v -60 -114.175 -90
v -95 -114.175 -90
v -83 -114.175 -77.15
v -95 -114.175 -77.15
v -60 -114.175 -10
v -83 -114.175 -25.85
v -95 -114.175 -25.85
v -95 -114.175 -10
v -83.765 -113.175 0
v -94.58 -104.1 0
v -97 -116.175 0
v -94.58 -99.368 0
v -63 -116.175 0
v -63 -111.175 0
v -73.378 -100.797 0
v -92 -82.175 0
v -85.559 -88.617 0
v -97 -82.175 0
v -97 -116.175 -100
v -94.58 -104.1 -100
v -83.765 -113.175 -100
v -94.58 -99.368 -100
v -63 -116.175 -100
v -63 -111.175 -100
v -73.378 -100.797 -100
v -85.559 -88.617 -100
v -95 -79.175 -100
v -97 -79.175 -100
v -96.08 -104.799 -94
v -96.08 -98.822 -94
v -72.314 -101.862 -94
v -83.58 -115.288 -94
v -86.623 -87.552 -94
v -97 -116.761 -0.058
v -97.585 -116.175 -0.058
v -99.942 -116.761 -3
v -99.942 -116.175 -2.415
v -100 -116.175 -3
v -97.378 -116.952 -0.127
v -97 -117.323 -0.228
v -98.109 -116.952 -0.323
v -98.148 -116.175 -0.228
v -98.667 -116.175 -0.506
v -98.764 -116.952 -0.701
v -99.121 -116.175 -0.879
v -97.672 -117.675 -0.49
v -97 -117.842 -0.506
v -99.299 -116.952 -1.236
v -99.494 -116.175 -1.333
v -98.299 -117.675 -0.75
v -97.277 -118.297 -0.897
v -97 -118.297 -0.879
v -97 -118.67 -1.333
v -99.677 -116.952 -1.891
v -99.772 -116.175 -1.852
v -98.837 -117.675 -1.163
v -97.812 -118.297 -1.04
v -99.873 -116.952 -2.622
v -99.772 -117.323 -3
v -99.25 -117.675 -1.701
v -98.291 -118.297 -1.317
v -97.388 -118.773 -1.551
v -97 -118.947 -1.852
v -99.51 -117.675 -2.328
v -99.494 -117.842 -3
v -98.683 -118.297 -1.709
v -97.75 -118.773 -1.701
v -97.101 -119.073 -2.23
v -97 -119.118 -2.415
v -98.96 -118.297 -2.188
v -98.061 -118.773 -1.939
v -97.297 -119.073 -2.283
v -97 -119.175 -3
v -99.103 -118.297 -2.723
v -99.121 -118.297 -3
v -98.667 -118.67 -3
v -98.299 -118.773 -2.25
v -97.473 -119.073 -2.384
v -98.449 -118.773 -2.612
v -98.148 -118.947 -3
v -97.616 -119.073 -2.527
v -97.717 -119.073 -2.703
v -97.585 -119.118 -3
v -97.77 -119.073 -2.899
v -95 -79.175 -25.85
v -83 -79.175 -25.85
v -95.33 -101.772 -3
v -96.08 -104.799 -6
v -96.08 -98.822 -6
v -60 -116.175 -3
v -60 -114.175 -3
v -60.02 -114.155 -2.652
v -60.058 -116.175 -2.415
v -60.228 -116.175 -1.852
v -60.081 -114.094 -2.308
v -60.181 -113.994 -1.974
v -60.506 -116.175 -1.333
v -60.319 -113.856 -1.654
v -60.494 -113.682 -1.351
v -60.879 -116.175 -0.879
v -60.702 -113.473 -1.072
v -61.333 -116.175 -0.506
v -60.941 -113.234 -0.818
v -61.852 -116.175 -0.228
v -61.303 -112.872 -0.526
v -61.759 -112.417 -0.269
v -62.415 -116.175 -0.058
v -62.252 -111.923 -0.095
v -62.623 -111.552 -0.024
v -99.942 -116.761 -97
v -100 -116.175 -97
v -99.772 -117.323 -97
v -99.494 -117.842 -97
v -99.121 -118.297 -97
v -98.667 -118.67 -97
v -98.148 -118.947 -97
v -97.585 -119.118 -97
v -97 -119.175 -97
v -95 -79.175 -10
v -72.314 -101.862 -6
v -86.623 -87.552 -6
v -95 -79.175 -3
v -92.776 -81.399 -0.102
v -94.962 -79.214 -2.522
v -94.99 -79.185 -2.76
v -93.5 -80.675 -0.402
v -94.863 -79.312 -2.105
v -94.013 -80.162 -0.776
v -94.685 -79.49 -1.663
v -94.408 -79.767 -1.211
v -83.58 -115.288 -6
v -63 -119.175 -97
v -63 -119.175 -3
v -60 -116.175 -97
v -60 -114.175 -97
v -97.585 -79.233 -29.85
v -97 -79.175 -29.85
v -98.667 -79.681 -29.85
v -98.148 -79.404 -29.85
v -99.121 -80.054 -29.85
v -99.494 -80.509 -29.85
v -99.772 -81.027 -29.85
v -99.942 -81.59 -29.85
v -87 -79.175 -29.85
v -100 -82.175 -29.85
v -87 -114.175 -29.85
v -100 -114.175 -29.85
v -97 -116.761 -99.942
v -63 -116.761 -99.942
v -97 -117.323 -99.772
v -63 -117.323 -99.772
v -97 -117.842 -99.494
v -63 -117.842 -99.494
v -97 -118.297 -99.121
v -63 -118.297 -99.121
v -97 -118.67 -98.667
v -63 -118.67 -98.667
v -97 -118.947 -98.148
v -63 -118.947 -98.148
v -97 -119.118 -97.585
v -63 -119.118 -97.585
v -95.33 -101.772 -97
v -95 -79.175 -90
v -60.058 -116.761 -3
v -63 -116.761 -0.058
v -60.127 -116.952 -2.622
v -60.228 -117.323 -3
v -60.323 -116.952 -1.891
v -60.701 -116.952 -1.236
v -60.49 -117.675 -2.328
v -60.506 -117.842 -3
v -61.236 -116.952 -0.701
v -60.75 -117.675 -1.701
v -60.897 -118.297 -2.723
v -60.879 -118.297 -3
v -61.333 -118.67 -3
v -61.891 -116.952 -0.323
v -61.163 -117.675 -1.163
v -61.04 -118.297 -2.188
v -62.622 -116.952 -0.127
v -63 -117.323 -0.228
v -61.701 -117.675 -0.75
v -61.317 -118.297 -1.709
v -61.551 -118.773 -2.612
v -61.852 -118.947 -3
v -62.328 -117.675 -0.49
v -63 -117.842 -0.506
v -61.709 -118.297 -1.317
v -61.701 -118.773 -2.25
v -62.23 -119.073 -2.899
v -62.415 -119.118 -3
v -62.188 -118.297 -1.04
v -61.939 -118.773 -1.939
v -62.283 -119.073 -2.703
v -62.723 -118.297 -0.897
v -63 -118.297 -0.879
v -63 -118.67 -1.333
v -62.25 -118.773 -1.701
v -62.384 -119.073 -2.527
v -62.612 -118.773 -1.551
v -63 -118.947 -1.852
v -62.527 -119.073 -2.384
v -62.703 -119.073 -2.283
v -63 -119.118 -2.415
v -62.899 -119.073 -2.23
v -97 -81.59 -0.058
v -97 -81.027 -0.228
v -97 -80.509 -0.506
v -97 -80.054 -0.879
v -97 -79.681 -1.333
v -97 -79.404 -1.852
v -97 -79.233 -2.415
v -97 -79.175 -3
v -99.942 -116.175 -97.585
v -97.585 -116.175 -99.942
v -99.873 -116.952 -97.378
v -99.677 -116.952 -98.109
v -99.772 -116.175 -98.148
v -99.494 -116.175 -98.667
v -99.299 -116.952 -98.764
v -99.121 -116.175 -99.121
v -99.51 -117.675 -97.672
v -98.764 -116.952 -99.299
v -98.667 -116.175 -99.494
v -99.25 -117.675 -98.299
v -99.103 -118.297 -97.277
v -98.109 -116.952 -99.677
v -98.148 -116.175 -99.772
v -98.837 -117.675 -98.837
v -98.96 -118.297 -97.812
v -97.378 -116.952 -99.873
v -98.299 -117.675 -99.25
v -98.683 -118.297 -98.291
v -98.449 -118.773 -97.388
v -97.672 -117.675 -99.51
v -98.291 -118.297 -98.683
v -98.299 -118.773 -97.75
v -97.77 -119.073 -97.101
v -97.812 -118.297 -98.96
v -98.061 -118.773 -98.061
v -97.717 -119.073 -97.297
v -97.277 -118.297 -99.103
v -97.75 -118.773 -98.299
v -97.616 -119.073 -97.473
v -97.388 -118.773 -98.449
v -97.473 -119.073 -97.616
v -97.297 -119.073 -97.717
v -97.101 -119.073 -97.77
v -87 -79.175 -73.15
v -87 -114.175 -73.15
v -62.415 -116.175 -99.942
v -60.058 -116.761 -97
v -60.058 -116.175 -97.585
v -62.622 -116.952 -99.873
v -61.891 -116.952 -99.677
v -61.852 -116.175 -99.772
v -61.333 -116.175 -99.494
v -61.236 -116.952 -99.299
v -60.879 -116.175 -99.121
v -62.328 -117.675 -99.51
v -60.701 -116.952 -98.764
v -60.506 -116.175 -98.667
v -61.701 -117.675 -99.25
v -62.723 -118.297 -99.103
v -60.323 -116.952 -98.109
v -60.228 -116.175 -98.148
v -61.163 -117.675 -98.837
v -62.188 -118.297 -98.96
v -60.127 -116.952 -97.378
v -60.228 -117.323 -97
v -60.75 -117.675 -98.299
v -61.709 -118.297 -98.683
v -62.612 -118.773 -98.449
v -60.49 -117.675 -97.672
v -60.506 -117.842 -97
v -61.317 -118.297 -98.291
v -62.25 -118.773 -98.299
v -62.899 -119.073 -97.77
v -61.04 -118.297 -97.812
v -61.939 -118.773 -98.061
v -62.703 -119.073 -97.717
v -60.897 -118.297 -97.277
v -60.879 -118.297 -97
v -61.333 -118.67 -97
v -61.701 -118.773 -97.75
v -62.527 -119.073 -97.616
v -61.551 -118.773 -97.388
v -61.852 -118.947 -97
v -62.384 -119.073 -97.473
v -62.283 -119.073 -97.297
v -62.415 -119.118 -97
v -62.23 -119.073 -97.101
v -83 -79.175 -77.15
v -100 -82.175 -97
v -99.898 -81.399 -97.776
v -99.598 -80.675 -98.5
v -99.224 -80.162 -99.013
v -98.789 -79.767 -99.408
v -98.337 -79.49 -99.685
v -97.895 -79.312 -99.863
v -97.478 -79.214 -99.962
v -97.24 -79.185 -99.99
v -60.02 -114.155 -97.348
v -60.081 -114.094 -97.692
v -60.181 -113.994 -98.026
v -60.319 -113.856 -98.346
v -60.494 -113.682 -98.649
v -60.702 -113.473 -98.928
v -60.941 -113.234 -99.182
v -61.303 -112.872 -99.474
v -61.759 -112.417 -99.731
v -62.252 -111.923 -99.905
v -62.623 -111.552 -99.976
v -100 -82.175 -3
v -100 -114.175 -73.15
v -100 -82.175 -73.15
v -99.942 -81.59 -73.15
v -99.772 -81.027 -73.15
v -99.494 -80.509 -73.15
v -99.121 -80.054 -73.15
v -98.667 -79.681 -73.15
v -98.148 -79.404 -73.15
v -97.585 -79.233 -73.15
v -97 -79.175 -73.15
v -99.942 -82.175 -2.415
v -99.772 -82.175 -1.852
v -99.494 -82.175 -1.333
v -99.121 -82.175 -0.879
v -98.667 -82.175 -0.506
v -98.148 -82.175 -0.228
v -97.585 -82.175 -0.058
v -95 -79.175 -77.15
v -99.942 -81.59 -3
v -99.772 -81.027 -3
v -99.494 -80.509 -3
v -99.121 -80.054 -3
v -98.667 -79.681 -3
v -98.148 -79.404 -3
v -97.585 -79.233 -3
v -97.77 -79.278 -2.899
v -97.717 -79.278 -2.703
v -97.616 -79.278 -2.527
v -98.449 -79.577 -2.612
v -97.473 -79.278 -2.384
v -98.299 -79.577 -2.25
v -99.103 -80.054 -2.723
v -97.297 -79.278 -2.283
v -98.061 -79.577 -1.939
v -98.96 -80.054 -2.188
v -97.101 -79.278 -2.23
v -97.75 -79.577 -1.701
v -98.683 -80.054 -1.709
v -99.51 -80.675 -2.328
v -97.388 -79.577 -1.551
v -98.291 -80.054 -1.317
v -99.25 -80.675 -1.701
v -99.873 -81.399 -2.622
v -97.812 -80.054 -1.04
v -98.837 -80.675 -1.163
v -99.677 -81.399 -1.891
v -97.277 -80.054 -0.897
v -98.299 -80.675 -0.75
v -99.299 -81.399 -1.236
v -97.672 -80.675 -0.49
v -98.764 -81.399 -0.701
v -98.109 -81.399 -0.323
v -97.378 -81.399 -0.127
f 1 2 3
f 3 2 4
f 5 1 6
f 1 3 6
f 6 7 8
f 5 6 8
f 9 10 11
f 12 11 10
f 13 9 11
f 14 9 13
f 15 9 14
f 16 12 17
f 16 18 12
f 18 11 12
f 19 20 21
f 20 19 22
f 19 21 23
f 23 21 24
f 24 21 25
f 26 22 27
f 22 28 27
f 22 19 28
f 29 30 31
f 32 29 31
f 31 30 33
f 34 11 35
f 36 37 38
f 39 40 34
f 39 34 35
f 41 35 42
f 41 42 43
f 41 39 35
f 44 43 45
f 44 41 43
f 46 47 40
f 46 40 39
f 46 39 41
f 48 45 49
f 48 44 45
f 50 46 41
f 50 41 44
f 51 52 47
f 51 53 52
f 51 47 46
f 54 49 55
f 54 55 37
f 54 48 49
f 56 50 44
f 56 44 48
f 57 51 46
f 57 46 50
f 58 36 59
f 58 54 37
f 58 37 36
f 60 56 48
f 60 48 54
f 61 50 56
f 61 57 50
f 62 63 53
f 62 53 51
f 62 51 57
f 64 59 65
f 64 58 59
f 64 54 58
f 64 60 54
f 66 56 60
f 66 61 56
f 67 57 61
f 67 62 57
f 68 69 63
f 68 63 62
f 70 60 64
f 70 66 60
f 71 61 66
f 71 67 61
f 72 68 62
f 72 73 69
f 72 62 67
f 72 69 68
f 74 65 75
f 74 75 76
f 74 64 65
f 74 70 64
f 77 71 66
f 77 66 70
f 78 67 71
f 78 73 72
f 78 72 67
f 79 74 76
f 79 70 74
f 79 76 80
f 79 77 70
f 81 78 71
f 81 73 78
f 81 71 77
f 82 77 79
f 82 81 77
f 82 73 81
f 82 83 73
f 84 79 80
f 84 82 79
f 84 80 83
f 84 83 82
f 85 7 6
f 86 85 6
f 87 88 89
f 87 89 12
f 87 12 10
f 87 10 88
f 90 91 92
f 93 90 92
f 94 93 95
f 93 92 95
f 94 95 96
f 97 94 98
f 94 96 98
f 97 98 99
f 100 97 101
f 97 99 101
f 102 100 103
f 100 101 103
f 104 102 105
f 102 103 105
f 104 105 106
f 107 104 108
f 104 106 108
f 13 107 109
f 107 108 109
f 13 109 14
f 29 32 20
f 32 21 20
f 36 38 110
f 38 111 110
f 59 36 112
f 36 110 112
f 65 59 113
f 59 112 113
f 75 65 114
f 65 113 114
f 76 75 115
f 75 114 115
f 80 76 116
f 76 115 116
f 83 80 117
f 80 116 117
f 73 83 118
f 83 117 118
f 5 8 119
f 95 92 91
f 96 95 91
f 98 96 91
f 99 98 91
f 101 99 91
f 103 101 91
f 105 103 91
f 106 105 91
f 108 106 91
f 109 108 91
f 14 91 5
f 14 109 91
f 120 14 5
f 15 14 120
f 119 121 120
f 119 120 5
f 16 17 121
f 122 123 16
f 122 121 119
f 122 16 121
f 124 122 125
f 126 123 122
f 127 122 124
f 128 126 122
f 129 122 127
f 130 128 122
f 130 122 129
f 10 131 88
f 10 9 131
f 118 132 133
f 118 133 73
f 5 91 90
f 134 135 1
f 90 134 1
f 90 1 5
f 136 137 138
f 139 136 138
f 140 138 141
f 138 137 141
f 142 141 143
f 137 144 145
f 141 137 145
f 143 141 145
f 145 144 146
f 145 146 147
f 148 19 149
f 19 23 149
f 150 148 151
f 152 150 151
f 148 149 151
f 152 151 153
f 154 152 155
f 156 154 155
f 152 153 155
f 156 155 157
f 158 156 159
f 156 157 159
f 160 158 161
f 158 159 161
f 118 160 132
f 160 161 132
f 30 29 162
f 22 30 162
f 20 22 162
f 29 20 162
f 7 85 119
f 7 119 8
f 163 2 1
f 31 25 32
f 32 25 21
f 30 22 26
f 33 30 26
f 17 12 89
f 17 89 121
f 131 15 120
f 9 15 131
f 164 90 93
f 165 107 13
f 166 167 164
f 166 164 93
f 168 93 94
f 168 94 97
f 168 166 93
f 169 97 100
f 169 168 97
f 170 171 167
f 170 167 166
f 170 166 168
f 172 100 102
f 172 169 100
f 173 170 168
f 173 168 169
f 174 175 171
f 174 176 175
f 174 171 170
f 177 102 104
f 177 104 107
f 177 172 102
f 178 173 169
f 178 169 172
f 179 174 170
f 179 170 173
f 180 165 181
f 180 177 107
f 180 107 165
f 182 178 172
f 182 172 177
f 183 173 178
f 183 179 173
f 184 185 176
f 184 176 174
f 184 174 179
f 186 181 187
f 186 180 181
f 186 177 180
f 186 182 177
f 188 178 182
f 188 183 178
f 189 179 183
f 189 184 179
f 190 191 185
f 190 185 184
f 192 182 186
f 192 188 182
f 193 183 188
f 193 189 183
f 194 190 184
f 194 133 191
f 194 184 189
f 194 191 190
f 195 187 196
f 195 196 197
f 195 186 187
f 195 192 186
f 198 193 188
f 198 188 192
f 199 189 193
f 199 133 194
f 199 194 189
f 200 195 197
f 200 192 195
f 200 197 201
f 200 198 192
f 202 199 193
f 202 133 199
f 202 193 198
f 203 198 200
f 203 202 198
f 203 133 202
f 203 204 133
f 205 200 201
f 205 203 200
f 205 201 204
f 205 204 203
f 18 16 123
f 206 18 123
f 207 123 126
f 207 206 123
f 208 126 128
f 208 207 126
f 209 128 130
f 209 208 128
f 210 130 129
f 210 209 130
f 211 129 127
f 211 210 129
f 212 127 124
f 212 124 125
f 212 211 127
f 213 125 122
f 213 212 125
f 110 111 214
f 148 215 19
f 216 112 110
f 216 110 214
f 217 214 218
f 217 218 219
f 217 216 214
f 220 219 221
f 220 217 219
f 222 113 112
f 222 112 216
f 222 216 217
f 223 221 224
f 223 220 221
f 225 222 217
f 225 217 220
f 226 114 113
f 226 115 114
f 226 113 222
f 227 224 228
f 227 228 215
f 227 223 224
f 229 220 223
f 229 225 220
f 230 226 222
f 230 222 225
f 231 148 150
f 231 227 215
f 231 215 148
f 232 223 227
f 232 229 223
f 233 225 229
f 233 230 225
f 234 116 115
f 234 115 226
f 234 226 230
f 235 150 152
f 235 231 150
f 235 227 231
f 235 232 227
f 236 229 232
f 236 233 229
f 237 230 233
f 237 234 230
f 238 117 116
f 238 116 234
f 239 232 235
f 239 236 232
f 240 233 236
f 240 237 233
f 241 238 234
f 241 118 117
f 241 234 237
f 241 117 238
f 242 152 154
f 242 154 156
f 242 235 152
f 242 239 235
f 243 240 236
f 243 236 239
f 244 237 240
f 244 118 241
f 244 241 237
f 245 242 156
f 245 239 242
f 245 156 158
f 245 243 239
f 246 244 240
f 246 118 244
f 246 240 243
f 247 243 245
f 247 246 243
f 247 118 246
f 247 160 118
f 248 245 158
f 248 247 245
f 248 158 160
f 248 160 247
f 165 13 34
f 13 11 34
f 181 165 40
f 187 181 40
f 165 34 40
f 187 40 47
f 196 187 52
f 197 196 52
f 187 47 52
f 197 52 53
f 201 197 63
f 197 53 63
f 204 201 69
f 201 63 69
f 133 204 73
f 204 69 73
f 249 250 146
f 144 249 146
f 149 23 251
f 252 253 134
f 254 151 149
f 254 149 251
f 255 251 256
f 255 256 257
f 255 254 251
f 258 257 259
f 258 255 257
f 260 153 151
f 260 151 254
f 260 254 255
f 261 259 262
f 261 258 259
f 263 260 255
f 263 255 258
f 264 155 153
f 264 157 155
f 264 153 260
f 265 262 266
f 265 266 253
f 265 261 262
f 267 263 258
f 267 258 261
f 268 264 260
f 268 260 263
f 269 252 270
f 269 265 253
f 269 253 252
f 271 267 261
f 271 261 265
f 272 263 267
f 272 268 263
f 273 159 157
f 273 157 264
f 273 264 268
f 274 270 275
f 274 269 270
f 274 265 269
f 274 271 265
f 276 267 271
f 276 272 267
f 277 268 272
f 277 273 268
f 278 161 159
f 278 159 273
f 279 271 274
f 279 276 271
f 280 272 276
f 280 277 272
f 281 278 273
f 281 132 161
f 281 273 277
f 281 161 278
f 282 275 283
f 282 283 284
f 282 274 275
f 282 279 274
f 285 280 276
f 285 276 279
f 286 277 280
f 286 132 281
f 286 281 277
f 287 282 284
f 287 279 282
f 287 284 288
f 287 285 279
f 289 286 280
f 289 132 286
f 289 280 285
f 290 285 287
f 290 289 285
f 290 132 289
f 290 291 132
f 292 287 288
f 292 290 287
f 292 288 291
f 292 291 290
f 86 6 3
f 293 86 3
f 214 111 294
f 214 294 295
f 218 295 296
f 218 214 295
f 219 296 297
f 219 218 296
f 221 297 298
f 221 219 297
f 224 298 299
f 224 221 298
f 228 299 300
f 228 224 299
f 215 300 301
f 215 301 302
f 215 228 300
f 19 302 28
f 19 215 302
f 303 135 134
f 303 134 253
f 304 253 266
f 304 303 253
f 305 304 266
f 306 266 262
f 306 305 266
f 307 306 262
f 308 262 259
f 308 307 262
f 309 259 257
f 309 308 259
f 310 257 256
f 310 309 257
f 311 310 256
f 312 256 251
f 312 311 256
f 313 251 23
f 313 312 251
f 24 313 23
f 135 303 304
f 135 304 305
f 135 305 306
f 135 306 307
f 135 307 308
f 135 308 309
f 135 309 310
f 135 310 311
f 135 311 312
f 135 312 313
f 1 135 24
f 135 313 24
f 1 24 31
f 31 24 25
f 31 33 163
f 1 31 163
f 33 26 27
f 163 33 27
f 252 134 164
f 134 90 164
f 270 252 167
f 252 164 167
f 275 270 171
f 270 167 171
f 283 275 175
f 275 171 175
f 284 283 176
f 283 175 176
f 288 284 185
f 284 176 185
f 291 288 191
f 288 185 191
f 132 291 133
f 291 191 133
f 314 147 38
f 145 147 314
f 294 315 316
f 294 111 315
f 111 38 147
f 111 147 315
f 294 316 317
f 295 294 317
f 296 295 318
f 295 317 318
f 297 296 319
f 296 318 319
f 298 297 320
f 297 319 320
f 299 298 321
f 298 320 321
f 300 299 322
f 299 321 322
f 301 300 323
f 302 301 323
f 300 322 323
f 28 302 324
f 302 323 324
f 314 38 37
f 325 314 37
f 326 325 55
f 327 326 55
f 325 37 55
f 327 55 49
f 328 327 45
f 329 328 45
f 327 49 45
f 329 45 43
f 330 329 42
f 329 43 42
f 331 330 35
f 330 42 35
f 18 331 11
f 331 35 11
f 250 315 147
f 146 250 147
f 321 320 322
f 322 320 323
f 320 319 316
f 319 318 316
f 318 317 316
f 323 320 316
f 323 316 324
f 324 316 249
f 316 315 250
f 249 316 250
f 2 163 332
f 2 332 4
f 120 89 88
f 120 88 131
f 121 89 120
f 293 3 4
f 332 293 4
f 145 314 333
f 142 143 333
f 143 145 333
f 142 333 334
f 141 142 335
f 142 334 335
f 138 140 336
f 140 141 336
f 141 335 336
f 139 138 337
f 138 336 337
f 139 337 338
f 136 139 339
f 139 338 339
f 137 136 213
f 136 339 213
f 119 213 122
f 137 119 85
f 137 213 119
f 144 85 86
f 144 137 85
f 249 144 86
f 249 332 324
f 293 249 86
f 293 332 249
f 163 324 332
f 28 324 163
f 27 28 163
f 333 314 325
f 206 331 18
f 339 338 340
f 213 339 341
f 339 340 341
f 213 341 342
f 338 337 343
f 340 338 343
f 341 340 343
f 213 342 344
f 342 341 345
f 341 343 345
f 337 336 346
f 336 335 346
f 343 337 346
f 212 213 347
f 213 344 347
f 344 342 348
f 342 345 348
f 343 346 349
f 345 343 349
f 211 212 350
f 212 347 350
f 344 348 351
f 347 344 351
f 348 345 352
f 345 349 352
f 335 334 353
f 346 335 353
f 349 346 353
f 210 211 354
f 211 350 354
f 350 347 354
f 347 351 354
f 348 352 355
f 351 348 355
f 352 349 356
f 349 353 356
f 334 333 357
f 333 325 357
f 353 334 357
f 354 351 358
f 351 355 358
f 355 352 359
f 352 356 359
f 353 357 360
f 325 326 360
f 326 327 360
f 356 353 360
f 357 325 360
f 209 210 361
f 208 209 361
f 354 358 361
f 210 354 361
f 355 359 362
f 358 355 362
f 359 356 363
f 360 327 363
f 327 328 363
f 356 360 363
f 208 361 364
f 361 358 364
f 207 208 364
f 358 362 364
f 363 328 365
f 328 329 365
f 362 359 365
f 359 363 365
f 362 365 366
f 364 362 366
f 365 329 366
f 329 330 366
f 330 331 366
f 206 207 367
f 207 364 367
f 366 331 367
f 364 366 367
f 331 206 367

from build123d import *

# Parameters (mm, degrees)
EXTRUDE_1_DEPTH     = 10
EXTRUDE_3_DEPTH     = 40
FILLET_2_R          = 3
FILLET_3_R          = 3
SKETCH_10_W         = 43.3
SKETCH_10_H         = 35
CUT_EXTRUDE_1_DEPTH = 12.8
EXTRUDE_4_DEPTH     = 35


with BuildPart() as part:
    # 草图3 → 凸台-拉伸1 (new body)
    with BuildSketch(Plane.XY):
        Polygon((-100, -79.175359259), (-100, -119.175359259), (-60, -119.175359259), (-60, -114.175359259), (-95, -79.175359259), align=None)
    extrude(amount=-EXTRUDE_1_DEPTH)

    # 草图5 → 切除-放样1 section 0
    with BuildSketch(Plane.XY.offset(-6)):
        with BuildLine():
            Line((-96.08, -104.799041882), (-96.08, -98.821989002))
            Line((-96.08, -98.821989002), (-81.709132385, -81.695455893))
            Line((-81.709132385, -81.695455893), (-66.265676412, -94.654054104))
            Line((-66.265676412, -94.654054104), (-83.579668035, -115.288065824))
            Line((-83.579668035, -115.288065824), (-96.08, -104.799041882))
        make_face()
    # 草图8 → 切除-放样1 section 1
    with BuildSketch(Plane.XY):
        with BuildLine():
            Line((-94.58, -104.099580395), (-94.58, -99.367944353))
            Line((-94.58, -99.367944353), (-80.56006572, -82.659637307))
            Line((-80.56006572, -82.659637307), (-67.414743077, -93.68987269))
            Line((-67.414743077, -93.68987269), (-83.764553285, -113.174817744))
            Line((-83.764553285, -113.174817744), (-94.58, -104.099580395))
        make_face()
    loft(mode=Mode.SUBTRACT)

    # 草图9 → 凸台-拉伸3 (add)
    with BuildSketch(Plane(origin=(0, 0, -10), x_dir=(-1, 0, 0), z_dir=(0, 0, -1))):
        Polygon((95, -79.175359259), (95, -114.175359259), (60, -114.175359259), (60, -119.175359259), (100, -119.175359259), (100, -79.175359259), align=None)
    extrude(amount=EXTRUDE_3_DEPTH)

    # 镜向2: part across plane


with BuildPart() as part_1:
    add(part.part)
    add(part.part.mirror(Plane(origin=(0, 0, -50), x_dir=(1, 0, 0), z_dir=(0, 0, -1))))

    # 圆角2
    fillet_2_edges = [part_1.edges().sort_by_distance(p)[0] for p in [
        (-60, -116.675359259, -100),
        (-60, -116.675359259, 0),
        (-100, -99.175359259, -100),
        (-100, -99.175359259, 0),
        (-100, -79.175359259, -50),
        (-97.5, -79.175359259, 0),
    ]]
    fillet(fillet_2_edges, radius=FILLET_2_R)

    # 圆角3
    fillet_3_edges = [part_1.edges().sort_by_distance(p)[0] for p in [
        (-80, -119.175359259, -100),
        (-80, -119.175359259, 0),
        (-100, -119.175359259, -50),
        (-60, -119.175359259, -50),
        (-99.121320344, -119.175359259, -0.878679656),
        (-99.121320344, -119.175359259, -99.121320344),
        (-60.878679656, -119.175359259, -0.878679656),
        (-60.878679656, -119.175359259, -99.121320344),
    ]]
    fillet(fillet_3_edges, radius=FILLET_3_R)

    # 草图10 → 切除-拉伸1 (cut)
    with BuildSketch(Plane.ZY.offset(100)):
        with Locations((-51.5, -96.675359259)):
            Rectangle(SKETCH_10_W, SKETCH_10_H)
    extrude(amount=-CUT_EXTRUDE_1_DEPTH, mode=Mode.SUBTRACT)

    # 草图11 → 凸台-拉伸4 (add)
    with BuildSketch(Plane(origin=(0, -114.175359259, 0), x_dir=(1, 0, 0), z_dir=(0, 1, 0))):
        Polygon((-95, 25.85), (-83, 25.85), (-83, 77.15), (-95, 77.15), (-95, 73.15), (-87, 73.15), (-87, 29.85), (-95, 29.85), align=None)
    extrude(amount=EXTRUDE_4_DEPTH)


solid = part_1.part
